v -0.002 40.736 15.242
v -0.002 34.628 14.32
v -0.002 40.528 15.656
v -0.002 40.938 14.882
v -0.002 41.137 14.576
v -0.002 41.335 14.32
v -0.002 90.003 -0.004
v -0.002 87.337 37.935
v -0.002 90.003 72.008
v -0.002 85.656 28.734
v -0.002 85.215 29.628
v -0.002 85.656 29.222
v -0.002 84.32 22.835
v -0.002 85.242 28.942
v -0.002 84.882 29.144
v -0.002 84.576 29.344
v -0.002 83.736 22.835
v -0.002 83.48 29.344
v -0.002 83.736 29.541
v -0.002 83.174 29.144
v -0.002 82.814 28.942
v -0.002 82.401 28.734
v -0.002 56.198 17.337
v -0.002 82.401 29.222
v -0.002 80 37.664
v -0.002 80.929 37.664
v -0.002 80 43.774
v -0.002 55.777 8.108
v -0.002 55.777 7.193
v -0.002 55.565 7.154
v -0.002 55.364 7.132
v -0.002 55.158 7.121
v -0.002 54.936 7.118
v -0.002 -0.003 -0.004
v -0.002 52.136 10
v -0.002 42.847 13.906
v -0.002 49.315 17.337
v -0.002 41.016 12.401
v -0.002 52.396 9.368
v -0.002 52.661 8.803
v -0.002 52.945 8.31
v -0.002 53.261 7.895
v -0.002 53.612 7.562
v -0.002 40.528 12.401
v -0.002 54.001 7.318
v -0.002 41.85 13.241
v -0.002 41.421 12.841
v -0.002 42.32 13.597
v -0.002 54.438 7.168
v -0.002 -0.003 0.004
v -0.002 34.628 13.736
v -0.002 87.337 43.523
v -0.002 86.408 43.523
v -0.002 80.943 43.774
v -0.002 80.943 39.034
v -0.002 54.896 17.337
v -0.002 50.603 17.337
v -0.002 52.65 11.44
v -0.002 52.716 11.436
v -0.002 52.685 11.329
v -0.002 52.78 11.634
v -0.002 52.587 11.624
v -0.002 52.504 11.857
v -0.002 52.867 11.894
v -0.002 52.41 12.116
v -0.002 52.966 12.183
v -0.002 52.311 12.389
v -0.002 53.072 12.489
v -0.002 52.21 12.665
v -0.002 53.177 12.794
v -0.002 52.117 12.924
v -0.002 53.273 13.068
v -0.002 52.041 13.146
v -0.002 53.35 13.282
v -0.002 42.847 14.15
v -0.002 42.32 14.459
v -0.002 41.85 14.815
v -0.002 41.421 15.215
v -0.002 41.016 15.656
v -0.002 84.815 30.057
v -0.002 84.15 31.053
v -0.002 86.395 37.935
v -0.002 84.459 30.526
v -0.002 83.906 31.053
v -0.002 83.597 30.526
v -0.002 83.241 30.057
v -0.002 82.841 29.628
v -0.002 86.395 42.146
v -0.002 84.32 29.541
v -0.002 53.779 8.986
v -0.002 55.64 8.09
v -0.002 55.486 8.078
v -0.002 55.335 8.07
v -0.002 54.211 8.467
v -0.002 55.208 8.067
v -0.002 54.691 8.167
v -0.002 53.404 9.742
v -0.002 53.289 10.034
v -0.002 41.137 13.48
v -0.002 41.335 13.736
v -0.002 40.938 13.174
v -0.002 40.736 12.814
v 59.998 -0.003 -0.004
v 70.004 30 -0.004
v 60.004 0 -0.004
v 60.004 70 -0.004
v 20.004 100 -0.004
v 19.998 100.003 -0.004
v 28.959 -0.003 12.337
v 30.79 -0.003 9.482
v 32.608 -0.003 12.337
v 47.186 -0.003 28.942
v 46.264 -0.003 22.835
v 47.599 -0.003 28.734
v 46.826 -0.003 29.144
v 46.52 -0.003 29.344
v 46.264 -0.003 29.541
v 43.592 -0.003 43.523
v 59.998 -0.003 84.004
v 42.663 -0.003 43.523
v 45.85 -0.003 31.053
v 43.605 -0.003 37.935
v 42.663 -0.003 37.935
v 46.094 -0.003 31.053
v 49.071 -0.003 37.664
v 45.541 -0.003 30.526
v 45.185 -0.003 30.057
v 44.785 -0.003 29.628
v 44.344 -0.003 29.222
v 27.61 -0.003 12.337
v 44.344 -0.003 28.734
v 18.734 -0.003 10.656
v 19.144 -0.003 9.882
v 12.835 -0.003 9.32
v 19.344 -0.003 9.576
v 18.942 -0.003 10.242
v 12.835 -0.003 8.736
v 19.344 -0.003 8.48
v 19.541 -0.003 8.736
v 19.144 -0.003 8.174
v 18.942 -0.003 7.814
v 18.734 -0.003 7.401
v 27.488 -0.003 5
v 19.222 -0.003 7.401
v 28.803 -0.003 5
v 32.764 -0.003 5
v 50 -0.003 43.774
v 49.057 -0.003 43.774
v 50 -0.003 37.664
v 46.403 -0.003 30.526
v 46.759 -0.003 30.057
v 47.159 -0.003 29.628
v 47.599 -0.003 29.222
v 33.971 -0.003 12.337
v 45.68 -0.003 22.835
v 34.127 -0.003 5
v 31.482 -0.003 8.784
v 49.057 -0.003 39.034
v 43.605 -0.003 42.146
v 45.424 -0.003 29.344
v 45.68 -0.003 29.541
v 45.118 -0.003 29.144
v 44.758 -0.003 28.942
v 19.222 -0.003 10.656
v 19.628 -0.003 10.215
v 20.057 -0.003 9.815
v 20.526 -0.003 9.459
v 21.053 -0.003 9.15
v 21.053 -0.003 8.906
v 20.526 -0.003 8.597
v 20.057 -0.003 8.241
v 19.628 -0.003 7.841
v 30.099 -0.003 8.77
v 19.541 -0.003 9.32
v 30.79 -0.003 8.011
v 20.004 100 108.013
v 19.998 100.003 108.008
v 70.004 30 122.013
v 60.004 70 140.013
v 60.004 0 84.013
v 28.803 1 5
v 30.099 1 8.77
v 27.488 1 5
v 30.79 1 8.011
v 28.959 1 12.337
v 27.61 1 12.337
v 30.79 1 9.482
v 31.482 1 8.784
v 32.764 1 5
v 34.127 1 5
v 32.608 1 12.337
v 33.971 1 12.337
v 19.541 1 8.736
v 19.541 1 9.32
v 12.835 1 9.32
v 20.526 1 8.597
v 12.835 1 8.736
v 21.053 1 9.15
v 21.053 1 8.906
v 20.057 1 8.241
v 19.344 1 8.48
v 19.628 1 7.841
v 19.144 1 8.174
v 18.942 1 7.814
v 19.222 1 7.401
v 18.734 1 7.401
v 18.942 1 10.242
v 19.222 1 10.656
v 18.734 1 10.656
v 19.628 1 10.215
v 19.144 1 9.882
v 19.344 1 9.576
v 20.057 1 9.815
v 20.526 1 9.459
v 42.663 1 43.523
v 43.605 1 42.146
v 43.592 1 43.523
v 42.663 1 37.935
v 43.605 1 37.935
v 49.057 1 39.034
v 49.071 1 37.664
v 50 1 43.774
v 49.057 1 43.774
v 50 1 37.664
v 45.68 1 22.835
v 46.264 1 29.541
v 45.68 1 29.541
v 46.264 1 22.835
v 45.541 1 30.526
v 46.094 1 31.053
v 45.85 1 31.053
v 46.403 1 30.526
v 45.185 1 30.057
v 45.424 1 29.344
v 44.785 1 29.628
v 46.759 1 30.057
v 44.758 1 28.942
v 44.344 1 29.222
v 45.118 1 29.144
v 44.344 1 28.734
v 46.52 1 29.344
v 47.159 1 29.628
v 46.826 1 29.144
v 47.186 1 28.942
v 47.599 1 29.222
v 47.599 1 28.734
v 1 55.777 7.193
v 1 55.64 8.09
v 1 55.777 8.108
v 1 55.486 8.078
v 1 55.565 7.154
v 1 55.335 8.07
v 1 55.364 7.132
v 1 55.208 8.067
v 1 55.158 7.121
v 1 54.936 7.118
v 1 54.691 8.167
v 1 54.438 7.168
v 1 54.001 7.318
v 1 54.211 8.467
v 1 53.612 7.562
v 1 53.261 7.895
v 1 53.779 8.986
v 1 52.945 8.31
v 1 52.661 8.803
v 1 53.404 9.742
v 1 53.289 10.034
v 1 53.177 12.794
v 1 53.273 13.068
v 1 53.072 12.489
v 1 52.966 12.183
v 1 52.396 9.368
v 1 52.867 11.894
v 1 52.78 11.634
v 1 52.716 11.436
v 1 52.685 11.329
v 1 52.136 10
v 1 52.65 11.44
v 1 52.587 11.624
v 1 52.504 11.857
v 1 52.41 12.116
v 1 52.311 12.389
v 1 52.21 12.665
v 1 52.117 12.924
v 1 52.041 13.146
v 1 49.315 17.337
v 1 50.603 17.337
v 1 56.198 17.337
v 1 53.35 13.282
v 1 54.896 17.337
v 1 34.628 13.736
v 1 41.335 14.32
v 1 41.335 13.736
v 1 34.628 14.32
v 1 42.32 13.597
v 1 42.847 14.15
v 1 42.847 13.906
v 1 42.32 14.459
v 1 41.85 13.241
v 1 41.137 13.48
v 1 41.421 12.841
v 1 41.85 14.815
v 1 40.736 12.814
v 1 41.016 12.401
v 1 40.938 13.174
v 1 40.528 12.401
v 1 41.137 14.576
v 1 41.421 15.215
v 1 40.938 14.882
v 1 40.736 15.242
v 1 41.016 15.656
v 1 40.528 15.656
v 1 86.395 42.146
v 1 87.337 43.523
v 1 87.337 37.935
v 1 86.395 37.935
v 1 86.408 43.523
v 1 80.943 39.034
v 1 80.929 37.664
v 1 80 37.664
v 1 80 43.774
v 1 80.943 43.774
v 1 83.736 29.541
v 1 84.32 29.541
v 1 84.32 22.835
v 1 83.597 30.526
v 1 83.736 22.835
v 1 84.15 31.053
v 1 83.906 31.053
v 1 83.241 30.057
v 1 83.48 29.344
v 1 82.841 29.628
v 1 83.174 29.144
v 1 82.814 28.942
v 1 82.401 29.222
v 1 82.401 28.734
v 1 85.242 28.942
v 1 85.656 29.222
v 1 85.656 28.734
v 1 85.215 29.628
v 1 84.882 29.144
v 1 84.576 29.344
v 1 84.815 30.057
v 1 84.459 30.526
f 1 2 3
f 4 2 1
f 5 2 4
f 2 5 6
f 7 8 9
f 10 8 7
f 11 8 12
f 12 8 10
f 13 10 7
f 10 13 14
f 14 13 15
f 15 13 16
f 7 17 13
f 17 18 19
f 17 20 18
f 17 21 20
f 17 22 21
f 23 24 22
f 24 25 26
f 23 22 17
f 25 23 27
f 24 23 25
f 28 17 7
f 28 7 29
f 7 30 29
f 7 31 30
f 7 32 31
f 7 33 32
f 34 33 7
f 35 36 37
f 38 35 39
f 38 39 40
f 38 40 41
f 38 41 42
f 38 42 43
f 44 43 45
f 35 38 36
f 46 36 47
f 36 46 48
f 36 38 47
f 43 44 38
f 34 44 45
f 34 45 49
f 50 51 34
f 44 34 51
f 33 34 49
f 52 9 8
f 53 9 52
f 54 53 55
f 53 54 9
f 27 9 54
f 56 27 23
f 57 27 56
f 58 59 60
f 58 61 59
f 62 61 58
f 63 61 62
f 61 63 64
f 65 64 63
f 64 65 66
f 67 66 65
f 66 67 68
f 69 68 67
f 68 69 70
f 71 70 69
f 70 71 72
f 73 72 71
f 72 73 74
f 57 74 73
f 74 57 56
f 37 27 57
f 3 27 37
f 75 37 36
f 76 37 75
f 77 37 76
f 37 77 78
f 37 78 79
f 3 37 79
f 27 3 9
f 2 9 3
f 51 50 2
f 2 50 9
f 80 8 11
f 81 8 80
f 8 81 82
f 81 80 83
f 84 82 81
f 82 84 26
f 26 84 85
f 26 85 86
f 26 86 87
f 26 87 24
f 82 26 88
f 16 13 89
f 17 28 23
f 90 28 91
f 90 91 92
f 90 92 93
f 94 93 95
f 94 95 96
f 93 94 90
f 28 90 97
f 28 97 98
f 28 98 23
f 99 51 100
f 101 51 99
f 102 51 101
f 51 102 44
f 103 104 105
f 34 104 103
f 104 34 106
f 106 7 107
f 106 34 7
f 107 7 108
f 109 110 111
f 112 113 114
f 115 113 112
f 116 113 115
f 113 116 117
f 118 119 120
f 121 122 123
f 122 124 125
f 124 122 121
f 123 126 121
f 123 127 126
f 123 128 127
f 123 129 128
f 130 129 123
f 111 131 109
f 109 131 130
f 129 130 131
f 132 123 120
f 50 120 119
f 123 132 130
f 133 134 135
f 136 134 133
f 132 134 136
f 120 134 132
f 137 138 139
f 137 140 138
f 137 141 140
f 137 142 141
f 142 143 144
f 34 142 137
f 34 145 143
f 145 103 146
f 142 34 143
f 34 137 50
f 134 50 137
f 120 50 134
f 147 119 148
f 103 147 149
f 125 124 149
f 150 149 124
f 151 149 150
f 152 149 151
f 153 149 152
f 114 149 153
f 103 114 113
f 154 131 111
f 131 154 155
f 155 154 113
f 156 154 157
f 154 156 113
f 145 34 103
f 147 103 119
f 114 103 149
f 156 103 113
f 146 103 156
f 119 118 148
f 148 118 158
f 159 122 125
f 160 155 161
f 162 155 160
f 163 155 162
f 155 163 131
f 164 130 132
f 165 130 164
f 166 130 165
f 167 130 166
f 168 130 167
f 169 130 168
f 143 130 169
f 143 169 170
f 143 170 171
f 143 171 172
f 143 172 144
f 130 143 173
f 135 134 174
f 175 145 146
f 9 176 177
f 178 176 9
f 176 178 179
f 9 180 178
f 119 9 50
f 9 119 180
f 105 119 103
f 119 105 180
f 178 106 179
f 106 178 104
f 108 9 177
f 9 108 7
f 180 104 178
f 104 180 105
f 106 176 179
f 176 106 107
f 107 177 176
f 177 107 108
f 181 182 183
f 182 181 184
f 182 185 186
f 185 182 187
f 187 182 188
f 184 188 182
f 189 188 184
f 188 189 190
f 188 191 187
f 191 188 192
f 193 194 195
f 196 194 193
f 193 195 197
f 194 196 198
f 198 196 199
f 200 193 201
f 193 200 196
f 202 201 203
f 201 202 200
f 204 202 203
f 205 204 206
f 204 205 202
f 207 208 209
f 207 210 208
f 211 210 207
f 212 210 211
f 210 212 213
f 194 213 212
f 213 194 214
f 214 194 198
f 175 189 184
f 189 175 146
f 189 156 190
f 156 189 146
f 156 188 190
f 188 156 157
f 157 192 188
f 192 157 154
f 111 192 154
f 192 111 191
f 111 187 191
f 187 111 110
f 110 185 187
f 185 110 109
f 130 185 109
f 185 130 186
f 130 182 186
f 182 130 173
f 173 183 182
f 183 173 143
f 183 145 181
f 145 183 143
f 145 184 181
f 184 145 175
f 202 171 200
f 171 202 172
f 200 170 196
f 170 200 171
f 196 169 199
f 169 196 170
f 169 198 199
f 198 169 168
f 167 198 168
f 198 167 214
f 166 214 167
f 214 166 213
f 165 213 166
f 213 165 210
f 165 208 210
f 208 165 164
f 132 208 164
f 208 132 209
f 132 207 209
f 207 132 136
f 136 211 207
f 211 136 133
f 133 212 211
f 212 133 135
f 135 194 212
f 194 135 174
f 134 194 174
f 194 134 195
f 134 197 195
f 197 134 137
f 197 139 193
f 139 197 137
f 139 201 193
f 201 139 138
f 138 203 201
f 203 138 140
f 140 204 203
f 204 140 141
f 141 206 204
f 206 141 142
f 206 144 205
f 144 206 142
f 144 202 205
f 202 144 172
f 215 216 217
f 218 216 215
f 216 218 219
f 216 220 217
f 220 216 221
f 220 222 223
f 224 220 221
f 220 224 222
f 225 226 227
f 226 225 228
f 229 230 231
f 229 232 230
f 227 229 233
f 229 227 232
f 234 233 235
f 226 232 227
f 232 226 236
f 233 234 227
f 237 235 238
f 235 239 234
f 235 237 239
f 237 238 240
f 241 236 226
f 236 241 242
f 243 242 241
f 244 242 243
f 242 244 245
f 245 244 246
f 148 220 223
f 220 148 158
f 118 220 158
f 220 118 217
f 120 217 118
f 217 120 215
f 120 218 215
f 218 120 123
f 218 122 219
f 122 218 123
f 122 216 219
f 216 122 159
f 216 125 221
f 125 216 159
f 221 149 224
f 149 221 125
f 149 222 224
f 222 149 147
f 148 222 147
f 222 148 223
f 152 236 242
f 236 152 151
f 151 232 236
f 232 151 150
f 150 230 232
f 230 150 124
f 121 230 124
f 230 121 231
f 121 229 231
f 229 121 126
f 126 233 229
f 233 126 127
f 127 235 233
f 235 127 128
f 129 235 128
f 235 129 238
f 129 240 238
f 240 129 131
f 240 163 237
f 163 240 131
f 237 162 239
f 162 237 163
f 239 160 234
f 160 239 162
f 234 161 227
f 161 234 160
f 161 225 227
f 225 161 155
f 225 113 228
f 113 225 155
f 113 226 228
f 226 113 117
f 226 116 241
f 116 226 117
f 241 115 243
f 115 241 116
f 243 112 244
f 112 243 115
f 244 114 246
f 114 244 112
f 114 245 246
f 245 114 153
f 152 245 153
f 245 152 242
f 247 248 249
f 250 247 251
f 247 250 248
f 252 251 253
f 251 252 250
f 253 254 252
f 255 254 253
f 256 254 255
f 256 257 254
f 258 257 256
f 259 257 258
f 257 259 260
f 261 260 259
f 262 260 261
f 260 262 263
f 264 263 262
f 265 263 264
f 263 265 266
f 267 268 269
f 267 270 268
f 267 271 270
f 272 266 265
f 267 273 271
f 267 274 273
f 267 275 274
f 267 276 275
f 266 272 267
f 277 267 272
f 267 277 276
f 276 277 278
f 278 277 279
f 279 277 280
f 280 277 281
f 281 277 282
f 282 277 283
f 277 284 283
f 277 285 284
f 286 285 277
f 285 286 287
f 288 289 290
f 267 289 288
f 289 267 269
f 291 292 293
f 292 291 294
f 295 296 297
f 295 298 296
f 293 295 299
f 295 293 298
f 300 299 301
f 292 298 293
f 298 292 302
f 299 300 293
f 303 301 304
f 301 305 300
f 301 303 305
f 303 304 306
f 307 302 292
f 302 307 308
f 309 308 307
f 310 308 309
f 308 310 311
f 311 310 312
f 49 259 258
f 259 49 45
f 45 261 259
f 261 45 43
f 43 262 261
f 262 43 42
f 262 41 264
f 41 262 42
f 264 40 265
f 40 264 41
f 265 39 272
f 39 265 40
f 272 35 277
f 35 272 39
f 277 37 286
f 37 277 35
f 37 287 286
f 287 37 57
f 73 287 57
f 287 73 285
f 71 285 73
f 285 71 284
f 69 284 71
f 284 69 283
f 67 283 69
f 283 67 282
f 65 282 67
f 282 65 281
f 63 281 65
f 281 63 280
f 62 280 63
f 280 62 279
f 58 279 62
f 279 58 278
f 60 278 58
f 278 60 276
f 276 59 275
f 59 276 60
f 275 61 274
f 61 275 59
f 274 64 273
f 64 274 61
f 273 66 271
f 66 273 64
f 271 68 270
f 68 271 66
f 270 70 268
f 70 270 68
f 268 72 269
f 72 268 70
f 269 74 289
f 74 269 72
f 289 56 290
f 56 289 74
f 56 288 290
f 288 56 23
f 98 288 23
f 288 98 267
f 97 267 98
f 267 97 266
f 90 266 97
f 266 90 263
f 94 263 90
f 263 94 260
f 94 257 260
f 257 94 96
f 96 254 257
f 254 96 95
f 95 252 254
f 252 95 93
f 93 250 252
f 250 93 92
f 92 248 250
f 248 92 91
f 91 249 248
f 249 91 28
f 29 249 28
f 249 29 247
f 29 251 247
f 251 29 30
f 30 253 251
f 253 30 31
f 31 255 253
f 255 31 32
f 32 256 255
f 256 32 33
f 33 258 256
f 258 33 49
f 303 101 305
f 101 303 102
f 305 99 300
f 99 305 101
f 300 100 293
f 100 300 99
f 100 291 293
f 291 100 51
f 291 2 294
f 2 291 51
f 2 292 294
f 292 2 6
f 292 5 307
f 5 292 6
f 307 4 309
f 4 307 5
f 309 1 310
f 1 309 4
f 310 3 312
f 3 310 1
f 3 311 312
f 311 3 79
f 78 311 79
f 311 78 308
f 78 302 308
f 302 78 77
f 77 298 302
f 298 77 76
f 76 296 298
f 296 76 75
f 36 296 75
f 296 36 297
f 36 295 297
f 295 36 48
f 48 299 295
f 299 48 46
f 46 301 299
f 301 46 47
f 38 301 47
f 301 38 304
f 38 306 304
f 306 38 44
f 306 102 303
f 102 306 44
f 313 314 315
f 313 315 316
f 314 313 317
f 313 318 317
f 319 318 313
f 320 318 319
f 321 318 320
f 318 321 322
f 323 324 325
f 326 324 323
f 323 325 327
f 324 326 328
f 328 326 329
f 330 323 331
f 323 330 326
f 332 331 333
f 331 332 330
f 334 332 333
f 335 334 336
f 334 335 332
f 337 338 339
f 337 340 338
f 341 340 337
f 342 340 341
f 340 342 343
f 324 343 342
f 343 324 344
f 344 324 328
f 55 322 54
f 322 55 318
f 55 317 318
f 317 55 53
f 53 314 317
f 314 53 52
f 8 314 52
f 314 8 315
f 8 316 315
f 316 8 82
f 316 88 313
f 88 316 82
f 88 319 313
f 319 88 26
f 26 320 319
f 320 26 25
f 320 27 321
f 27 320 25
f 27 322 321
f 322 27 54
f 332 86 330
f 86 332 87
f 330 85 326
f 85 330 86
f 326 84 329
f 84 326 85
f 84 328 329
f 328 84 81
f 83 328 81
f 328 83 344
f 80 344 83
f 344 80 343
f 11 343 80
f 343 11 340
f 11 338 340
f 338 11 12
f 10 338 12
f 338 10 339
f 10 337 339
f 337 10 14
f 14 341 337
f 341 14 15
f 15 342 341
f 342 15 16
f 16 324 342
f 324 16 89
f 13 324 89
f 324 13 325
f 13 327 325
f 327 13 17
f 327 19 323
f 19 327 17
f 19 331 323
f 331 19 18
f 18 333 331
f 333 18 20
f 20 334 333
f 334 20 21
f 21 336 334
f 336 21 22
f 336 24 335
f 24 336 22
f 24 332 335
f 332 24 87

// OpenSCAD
/* Lecture example, simplex algorithm.
   Convex set in x-y-plane, objective function in z-direction
   
   Copyright, 2022, Mathias Moog, Hochschule Ansbach, Deutschland, CC-BY-NC-SA
*/   

  
  
d =0.01;  // Dimension of the spheres arround the points
h=2;      // (half) depth of the inscription
$fn=3;    // low resultion of the spheres

// inscription of height h 
module mtext( t ) {
  linear_extrude(height=h) text( t );
}  

// create a small sphere arround the point p
module point( p ) {
  translate(p) sphere(d=d);
}

// convex hull of a point set ps
module convex_hull( ps ) {
  hull() {
    for( p=ps ) point(p);
    }
}

// outer points, specify the objective function 
outer_points = [ [0,0,0], [200,0,0], [200,0,280], [0,200,0], [0,200,160] ];

// convex set, projection on z=0
bottom_points = [ [0,0,0], [60,0,0], [70,30,0], [60,70,0], [20,100,0], [0,90,0] ];


difference() { // only for inscription
  intersection() {
  // objectiv function 
  convex_hull( outer_points );
  // restrictions
  hull() {
    convex_hull( bottom_points ); // bottom
    translate([0,0,200]) convex_hull( bottom_points ); // high enough ...
    }
  }
  // inscription on the sides
  translate([10,h/2,5]) rotate([90,0,0]) mtext("\u2192 x ");
  translate([50,h/2,20]) rotate([90,-90,0]) mtext("\u2192 z ");
  translate([h/2,60,10]) rotate([90,0,-90]) mtext(" y \u2190");
  translate([h/2,80,20]) rotate([90,-90,-90]) mtext("\u2192 z ");
}
